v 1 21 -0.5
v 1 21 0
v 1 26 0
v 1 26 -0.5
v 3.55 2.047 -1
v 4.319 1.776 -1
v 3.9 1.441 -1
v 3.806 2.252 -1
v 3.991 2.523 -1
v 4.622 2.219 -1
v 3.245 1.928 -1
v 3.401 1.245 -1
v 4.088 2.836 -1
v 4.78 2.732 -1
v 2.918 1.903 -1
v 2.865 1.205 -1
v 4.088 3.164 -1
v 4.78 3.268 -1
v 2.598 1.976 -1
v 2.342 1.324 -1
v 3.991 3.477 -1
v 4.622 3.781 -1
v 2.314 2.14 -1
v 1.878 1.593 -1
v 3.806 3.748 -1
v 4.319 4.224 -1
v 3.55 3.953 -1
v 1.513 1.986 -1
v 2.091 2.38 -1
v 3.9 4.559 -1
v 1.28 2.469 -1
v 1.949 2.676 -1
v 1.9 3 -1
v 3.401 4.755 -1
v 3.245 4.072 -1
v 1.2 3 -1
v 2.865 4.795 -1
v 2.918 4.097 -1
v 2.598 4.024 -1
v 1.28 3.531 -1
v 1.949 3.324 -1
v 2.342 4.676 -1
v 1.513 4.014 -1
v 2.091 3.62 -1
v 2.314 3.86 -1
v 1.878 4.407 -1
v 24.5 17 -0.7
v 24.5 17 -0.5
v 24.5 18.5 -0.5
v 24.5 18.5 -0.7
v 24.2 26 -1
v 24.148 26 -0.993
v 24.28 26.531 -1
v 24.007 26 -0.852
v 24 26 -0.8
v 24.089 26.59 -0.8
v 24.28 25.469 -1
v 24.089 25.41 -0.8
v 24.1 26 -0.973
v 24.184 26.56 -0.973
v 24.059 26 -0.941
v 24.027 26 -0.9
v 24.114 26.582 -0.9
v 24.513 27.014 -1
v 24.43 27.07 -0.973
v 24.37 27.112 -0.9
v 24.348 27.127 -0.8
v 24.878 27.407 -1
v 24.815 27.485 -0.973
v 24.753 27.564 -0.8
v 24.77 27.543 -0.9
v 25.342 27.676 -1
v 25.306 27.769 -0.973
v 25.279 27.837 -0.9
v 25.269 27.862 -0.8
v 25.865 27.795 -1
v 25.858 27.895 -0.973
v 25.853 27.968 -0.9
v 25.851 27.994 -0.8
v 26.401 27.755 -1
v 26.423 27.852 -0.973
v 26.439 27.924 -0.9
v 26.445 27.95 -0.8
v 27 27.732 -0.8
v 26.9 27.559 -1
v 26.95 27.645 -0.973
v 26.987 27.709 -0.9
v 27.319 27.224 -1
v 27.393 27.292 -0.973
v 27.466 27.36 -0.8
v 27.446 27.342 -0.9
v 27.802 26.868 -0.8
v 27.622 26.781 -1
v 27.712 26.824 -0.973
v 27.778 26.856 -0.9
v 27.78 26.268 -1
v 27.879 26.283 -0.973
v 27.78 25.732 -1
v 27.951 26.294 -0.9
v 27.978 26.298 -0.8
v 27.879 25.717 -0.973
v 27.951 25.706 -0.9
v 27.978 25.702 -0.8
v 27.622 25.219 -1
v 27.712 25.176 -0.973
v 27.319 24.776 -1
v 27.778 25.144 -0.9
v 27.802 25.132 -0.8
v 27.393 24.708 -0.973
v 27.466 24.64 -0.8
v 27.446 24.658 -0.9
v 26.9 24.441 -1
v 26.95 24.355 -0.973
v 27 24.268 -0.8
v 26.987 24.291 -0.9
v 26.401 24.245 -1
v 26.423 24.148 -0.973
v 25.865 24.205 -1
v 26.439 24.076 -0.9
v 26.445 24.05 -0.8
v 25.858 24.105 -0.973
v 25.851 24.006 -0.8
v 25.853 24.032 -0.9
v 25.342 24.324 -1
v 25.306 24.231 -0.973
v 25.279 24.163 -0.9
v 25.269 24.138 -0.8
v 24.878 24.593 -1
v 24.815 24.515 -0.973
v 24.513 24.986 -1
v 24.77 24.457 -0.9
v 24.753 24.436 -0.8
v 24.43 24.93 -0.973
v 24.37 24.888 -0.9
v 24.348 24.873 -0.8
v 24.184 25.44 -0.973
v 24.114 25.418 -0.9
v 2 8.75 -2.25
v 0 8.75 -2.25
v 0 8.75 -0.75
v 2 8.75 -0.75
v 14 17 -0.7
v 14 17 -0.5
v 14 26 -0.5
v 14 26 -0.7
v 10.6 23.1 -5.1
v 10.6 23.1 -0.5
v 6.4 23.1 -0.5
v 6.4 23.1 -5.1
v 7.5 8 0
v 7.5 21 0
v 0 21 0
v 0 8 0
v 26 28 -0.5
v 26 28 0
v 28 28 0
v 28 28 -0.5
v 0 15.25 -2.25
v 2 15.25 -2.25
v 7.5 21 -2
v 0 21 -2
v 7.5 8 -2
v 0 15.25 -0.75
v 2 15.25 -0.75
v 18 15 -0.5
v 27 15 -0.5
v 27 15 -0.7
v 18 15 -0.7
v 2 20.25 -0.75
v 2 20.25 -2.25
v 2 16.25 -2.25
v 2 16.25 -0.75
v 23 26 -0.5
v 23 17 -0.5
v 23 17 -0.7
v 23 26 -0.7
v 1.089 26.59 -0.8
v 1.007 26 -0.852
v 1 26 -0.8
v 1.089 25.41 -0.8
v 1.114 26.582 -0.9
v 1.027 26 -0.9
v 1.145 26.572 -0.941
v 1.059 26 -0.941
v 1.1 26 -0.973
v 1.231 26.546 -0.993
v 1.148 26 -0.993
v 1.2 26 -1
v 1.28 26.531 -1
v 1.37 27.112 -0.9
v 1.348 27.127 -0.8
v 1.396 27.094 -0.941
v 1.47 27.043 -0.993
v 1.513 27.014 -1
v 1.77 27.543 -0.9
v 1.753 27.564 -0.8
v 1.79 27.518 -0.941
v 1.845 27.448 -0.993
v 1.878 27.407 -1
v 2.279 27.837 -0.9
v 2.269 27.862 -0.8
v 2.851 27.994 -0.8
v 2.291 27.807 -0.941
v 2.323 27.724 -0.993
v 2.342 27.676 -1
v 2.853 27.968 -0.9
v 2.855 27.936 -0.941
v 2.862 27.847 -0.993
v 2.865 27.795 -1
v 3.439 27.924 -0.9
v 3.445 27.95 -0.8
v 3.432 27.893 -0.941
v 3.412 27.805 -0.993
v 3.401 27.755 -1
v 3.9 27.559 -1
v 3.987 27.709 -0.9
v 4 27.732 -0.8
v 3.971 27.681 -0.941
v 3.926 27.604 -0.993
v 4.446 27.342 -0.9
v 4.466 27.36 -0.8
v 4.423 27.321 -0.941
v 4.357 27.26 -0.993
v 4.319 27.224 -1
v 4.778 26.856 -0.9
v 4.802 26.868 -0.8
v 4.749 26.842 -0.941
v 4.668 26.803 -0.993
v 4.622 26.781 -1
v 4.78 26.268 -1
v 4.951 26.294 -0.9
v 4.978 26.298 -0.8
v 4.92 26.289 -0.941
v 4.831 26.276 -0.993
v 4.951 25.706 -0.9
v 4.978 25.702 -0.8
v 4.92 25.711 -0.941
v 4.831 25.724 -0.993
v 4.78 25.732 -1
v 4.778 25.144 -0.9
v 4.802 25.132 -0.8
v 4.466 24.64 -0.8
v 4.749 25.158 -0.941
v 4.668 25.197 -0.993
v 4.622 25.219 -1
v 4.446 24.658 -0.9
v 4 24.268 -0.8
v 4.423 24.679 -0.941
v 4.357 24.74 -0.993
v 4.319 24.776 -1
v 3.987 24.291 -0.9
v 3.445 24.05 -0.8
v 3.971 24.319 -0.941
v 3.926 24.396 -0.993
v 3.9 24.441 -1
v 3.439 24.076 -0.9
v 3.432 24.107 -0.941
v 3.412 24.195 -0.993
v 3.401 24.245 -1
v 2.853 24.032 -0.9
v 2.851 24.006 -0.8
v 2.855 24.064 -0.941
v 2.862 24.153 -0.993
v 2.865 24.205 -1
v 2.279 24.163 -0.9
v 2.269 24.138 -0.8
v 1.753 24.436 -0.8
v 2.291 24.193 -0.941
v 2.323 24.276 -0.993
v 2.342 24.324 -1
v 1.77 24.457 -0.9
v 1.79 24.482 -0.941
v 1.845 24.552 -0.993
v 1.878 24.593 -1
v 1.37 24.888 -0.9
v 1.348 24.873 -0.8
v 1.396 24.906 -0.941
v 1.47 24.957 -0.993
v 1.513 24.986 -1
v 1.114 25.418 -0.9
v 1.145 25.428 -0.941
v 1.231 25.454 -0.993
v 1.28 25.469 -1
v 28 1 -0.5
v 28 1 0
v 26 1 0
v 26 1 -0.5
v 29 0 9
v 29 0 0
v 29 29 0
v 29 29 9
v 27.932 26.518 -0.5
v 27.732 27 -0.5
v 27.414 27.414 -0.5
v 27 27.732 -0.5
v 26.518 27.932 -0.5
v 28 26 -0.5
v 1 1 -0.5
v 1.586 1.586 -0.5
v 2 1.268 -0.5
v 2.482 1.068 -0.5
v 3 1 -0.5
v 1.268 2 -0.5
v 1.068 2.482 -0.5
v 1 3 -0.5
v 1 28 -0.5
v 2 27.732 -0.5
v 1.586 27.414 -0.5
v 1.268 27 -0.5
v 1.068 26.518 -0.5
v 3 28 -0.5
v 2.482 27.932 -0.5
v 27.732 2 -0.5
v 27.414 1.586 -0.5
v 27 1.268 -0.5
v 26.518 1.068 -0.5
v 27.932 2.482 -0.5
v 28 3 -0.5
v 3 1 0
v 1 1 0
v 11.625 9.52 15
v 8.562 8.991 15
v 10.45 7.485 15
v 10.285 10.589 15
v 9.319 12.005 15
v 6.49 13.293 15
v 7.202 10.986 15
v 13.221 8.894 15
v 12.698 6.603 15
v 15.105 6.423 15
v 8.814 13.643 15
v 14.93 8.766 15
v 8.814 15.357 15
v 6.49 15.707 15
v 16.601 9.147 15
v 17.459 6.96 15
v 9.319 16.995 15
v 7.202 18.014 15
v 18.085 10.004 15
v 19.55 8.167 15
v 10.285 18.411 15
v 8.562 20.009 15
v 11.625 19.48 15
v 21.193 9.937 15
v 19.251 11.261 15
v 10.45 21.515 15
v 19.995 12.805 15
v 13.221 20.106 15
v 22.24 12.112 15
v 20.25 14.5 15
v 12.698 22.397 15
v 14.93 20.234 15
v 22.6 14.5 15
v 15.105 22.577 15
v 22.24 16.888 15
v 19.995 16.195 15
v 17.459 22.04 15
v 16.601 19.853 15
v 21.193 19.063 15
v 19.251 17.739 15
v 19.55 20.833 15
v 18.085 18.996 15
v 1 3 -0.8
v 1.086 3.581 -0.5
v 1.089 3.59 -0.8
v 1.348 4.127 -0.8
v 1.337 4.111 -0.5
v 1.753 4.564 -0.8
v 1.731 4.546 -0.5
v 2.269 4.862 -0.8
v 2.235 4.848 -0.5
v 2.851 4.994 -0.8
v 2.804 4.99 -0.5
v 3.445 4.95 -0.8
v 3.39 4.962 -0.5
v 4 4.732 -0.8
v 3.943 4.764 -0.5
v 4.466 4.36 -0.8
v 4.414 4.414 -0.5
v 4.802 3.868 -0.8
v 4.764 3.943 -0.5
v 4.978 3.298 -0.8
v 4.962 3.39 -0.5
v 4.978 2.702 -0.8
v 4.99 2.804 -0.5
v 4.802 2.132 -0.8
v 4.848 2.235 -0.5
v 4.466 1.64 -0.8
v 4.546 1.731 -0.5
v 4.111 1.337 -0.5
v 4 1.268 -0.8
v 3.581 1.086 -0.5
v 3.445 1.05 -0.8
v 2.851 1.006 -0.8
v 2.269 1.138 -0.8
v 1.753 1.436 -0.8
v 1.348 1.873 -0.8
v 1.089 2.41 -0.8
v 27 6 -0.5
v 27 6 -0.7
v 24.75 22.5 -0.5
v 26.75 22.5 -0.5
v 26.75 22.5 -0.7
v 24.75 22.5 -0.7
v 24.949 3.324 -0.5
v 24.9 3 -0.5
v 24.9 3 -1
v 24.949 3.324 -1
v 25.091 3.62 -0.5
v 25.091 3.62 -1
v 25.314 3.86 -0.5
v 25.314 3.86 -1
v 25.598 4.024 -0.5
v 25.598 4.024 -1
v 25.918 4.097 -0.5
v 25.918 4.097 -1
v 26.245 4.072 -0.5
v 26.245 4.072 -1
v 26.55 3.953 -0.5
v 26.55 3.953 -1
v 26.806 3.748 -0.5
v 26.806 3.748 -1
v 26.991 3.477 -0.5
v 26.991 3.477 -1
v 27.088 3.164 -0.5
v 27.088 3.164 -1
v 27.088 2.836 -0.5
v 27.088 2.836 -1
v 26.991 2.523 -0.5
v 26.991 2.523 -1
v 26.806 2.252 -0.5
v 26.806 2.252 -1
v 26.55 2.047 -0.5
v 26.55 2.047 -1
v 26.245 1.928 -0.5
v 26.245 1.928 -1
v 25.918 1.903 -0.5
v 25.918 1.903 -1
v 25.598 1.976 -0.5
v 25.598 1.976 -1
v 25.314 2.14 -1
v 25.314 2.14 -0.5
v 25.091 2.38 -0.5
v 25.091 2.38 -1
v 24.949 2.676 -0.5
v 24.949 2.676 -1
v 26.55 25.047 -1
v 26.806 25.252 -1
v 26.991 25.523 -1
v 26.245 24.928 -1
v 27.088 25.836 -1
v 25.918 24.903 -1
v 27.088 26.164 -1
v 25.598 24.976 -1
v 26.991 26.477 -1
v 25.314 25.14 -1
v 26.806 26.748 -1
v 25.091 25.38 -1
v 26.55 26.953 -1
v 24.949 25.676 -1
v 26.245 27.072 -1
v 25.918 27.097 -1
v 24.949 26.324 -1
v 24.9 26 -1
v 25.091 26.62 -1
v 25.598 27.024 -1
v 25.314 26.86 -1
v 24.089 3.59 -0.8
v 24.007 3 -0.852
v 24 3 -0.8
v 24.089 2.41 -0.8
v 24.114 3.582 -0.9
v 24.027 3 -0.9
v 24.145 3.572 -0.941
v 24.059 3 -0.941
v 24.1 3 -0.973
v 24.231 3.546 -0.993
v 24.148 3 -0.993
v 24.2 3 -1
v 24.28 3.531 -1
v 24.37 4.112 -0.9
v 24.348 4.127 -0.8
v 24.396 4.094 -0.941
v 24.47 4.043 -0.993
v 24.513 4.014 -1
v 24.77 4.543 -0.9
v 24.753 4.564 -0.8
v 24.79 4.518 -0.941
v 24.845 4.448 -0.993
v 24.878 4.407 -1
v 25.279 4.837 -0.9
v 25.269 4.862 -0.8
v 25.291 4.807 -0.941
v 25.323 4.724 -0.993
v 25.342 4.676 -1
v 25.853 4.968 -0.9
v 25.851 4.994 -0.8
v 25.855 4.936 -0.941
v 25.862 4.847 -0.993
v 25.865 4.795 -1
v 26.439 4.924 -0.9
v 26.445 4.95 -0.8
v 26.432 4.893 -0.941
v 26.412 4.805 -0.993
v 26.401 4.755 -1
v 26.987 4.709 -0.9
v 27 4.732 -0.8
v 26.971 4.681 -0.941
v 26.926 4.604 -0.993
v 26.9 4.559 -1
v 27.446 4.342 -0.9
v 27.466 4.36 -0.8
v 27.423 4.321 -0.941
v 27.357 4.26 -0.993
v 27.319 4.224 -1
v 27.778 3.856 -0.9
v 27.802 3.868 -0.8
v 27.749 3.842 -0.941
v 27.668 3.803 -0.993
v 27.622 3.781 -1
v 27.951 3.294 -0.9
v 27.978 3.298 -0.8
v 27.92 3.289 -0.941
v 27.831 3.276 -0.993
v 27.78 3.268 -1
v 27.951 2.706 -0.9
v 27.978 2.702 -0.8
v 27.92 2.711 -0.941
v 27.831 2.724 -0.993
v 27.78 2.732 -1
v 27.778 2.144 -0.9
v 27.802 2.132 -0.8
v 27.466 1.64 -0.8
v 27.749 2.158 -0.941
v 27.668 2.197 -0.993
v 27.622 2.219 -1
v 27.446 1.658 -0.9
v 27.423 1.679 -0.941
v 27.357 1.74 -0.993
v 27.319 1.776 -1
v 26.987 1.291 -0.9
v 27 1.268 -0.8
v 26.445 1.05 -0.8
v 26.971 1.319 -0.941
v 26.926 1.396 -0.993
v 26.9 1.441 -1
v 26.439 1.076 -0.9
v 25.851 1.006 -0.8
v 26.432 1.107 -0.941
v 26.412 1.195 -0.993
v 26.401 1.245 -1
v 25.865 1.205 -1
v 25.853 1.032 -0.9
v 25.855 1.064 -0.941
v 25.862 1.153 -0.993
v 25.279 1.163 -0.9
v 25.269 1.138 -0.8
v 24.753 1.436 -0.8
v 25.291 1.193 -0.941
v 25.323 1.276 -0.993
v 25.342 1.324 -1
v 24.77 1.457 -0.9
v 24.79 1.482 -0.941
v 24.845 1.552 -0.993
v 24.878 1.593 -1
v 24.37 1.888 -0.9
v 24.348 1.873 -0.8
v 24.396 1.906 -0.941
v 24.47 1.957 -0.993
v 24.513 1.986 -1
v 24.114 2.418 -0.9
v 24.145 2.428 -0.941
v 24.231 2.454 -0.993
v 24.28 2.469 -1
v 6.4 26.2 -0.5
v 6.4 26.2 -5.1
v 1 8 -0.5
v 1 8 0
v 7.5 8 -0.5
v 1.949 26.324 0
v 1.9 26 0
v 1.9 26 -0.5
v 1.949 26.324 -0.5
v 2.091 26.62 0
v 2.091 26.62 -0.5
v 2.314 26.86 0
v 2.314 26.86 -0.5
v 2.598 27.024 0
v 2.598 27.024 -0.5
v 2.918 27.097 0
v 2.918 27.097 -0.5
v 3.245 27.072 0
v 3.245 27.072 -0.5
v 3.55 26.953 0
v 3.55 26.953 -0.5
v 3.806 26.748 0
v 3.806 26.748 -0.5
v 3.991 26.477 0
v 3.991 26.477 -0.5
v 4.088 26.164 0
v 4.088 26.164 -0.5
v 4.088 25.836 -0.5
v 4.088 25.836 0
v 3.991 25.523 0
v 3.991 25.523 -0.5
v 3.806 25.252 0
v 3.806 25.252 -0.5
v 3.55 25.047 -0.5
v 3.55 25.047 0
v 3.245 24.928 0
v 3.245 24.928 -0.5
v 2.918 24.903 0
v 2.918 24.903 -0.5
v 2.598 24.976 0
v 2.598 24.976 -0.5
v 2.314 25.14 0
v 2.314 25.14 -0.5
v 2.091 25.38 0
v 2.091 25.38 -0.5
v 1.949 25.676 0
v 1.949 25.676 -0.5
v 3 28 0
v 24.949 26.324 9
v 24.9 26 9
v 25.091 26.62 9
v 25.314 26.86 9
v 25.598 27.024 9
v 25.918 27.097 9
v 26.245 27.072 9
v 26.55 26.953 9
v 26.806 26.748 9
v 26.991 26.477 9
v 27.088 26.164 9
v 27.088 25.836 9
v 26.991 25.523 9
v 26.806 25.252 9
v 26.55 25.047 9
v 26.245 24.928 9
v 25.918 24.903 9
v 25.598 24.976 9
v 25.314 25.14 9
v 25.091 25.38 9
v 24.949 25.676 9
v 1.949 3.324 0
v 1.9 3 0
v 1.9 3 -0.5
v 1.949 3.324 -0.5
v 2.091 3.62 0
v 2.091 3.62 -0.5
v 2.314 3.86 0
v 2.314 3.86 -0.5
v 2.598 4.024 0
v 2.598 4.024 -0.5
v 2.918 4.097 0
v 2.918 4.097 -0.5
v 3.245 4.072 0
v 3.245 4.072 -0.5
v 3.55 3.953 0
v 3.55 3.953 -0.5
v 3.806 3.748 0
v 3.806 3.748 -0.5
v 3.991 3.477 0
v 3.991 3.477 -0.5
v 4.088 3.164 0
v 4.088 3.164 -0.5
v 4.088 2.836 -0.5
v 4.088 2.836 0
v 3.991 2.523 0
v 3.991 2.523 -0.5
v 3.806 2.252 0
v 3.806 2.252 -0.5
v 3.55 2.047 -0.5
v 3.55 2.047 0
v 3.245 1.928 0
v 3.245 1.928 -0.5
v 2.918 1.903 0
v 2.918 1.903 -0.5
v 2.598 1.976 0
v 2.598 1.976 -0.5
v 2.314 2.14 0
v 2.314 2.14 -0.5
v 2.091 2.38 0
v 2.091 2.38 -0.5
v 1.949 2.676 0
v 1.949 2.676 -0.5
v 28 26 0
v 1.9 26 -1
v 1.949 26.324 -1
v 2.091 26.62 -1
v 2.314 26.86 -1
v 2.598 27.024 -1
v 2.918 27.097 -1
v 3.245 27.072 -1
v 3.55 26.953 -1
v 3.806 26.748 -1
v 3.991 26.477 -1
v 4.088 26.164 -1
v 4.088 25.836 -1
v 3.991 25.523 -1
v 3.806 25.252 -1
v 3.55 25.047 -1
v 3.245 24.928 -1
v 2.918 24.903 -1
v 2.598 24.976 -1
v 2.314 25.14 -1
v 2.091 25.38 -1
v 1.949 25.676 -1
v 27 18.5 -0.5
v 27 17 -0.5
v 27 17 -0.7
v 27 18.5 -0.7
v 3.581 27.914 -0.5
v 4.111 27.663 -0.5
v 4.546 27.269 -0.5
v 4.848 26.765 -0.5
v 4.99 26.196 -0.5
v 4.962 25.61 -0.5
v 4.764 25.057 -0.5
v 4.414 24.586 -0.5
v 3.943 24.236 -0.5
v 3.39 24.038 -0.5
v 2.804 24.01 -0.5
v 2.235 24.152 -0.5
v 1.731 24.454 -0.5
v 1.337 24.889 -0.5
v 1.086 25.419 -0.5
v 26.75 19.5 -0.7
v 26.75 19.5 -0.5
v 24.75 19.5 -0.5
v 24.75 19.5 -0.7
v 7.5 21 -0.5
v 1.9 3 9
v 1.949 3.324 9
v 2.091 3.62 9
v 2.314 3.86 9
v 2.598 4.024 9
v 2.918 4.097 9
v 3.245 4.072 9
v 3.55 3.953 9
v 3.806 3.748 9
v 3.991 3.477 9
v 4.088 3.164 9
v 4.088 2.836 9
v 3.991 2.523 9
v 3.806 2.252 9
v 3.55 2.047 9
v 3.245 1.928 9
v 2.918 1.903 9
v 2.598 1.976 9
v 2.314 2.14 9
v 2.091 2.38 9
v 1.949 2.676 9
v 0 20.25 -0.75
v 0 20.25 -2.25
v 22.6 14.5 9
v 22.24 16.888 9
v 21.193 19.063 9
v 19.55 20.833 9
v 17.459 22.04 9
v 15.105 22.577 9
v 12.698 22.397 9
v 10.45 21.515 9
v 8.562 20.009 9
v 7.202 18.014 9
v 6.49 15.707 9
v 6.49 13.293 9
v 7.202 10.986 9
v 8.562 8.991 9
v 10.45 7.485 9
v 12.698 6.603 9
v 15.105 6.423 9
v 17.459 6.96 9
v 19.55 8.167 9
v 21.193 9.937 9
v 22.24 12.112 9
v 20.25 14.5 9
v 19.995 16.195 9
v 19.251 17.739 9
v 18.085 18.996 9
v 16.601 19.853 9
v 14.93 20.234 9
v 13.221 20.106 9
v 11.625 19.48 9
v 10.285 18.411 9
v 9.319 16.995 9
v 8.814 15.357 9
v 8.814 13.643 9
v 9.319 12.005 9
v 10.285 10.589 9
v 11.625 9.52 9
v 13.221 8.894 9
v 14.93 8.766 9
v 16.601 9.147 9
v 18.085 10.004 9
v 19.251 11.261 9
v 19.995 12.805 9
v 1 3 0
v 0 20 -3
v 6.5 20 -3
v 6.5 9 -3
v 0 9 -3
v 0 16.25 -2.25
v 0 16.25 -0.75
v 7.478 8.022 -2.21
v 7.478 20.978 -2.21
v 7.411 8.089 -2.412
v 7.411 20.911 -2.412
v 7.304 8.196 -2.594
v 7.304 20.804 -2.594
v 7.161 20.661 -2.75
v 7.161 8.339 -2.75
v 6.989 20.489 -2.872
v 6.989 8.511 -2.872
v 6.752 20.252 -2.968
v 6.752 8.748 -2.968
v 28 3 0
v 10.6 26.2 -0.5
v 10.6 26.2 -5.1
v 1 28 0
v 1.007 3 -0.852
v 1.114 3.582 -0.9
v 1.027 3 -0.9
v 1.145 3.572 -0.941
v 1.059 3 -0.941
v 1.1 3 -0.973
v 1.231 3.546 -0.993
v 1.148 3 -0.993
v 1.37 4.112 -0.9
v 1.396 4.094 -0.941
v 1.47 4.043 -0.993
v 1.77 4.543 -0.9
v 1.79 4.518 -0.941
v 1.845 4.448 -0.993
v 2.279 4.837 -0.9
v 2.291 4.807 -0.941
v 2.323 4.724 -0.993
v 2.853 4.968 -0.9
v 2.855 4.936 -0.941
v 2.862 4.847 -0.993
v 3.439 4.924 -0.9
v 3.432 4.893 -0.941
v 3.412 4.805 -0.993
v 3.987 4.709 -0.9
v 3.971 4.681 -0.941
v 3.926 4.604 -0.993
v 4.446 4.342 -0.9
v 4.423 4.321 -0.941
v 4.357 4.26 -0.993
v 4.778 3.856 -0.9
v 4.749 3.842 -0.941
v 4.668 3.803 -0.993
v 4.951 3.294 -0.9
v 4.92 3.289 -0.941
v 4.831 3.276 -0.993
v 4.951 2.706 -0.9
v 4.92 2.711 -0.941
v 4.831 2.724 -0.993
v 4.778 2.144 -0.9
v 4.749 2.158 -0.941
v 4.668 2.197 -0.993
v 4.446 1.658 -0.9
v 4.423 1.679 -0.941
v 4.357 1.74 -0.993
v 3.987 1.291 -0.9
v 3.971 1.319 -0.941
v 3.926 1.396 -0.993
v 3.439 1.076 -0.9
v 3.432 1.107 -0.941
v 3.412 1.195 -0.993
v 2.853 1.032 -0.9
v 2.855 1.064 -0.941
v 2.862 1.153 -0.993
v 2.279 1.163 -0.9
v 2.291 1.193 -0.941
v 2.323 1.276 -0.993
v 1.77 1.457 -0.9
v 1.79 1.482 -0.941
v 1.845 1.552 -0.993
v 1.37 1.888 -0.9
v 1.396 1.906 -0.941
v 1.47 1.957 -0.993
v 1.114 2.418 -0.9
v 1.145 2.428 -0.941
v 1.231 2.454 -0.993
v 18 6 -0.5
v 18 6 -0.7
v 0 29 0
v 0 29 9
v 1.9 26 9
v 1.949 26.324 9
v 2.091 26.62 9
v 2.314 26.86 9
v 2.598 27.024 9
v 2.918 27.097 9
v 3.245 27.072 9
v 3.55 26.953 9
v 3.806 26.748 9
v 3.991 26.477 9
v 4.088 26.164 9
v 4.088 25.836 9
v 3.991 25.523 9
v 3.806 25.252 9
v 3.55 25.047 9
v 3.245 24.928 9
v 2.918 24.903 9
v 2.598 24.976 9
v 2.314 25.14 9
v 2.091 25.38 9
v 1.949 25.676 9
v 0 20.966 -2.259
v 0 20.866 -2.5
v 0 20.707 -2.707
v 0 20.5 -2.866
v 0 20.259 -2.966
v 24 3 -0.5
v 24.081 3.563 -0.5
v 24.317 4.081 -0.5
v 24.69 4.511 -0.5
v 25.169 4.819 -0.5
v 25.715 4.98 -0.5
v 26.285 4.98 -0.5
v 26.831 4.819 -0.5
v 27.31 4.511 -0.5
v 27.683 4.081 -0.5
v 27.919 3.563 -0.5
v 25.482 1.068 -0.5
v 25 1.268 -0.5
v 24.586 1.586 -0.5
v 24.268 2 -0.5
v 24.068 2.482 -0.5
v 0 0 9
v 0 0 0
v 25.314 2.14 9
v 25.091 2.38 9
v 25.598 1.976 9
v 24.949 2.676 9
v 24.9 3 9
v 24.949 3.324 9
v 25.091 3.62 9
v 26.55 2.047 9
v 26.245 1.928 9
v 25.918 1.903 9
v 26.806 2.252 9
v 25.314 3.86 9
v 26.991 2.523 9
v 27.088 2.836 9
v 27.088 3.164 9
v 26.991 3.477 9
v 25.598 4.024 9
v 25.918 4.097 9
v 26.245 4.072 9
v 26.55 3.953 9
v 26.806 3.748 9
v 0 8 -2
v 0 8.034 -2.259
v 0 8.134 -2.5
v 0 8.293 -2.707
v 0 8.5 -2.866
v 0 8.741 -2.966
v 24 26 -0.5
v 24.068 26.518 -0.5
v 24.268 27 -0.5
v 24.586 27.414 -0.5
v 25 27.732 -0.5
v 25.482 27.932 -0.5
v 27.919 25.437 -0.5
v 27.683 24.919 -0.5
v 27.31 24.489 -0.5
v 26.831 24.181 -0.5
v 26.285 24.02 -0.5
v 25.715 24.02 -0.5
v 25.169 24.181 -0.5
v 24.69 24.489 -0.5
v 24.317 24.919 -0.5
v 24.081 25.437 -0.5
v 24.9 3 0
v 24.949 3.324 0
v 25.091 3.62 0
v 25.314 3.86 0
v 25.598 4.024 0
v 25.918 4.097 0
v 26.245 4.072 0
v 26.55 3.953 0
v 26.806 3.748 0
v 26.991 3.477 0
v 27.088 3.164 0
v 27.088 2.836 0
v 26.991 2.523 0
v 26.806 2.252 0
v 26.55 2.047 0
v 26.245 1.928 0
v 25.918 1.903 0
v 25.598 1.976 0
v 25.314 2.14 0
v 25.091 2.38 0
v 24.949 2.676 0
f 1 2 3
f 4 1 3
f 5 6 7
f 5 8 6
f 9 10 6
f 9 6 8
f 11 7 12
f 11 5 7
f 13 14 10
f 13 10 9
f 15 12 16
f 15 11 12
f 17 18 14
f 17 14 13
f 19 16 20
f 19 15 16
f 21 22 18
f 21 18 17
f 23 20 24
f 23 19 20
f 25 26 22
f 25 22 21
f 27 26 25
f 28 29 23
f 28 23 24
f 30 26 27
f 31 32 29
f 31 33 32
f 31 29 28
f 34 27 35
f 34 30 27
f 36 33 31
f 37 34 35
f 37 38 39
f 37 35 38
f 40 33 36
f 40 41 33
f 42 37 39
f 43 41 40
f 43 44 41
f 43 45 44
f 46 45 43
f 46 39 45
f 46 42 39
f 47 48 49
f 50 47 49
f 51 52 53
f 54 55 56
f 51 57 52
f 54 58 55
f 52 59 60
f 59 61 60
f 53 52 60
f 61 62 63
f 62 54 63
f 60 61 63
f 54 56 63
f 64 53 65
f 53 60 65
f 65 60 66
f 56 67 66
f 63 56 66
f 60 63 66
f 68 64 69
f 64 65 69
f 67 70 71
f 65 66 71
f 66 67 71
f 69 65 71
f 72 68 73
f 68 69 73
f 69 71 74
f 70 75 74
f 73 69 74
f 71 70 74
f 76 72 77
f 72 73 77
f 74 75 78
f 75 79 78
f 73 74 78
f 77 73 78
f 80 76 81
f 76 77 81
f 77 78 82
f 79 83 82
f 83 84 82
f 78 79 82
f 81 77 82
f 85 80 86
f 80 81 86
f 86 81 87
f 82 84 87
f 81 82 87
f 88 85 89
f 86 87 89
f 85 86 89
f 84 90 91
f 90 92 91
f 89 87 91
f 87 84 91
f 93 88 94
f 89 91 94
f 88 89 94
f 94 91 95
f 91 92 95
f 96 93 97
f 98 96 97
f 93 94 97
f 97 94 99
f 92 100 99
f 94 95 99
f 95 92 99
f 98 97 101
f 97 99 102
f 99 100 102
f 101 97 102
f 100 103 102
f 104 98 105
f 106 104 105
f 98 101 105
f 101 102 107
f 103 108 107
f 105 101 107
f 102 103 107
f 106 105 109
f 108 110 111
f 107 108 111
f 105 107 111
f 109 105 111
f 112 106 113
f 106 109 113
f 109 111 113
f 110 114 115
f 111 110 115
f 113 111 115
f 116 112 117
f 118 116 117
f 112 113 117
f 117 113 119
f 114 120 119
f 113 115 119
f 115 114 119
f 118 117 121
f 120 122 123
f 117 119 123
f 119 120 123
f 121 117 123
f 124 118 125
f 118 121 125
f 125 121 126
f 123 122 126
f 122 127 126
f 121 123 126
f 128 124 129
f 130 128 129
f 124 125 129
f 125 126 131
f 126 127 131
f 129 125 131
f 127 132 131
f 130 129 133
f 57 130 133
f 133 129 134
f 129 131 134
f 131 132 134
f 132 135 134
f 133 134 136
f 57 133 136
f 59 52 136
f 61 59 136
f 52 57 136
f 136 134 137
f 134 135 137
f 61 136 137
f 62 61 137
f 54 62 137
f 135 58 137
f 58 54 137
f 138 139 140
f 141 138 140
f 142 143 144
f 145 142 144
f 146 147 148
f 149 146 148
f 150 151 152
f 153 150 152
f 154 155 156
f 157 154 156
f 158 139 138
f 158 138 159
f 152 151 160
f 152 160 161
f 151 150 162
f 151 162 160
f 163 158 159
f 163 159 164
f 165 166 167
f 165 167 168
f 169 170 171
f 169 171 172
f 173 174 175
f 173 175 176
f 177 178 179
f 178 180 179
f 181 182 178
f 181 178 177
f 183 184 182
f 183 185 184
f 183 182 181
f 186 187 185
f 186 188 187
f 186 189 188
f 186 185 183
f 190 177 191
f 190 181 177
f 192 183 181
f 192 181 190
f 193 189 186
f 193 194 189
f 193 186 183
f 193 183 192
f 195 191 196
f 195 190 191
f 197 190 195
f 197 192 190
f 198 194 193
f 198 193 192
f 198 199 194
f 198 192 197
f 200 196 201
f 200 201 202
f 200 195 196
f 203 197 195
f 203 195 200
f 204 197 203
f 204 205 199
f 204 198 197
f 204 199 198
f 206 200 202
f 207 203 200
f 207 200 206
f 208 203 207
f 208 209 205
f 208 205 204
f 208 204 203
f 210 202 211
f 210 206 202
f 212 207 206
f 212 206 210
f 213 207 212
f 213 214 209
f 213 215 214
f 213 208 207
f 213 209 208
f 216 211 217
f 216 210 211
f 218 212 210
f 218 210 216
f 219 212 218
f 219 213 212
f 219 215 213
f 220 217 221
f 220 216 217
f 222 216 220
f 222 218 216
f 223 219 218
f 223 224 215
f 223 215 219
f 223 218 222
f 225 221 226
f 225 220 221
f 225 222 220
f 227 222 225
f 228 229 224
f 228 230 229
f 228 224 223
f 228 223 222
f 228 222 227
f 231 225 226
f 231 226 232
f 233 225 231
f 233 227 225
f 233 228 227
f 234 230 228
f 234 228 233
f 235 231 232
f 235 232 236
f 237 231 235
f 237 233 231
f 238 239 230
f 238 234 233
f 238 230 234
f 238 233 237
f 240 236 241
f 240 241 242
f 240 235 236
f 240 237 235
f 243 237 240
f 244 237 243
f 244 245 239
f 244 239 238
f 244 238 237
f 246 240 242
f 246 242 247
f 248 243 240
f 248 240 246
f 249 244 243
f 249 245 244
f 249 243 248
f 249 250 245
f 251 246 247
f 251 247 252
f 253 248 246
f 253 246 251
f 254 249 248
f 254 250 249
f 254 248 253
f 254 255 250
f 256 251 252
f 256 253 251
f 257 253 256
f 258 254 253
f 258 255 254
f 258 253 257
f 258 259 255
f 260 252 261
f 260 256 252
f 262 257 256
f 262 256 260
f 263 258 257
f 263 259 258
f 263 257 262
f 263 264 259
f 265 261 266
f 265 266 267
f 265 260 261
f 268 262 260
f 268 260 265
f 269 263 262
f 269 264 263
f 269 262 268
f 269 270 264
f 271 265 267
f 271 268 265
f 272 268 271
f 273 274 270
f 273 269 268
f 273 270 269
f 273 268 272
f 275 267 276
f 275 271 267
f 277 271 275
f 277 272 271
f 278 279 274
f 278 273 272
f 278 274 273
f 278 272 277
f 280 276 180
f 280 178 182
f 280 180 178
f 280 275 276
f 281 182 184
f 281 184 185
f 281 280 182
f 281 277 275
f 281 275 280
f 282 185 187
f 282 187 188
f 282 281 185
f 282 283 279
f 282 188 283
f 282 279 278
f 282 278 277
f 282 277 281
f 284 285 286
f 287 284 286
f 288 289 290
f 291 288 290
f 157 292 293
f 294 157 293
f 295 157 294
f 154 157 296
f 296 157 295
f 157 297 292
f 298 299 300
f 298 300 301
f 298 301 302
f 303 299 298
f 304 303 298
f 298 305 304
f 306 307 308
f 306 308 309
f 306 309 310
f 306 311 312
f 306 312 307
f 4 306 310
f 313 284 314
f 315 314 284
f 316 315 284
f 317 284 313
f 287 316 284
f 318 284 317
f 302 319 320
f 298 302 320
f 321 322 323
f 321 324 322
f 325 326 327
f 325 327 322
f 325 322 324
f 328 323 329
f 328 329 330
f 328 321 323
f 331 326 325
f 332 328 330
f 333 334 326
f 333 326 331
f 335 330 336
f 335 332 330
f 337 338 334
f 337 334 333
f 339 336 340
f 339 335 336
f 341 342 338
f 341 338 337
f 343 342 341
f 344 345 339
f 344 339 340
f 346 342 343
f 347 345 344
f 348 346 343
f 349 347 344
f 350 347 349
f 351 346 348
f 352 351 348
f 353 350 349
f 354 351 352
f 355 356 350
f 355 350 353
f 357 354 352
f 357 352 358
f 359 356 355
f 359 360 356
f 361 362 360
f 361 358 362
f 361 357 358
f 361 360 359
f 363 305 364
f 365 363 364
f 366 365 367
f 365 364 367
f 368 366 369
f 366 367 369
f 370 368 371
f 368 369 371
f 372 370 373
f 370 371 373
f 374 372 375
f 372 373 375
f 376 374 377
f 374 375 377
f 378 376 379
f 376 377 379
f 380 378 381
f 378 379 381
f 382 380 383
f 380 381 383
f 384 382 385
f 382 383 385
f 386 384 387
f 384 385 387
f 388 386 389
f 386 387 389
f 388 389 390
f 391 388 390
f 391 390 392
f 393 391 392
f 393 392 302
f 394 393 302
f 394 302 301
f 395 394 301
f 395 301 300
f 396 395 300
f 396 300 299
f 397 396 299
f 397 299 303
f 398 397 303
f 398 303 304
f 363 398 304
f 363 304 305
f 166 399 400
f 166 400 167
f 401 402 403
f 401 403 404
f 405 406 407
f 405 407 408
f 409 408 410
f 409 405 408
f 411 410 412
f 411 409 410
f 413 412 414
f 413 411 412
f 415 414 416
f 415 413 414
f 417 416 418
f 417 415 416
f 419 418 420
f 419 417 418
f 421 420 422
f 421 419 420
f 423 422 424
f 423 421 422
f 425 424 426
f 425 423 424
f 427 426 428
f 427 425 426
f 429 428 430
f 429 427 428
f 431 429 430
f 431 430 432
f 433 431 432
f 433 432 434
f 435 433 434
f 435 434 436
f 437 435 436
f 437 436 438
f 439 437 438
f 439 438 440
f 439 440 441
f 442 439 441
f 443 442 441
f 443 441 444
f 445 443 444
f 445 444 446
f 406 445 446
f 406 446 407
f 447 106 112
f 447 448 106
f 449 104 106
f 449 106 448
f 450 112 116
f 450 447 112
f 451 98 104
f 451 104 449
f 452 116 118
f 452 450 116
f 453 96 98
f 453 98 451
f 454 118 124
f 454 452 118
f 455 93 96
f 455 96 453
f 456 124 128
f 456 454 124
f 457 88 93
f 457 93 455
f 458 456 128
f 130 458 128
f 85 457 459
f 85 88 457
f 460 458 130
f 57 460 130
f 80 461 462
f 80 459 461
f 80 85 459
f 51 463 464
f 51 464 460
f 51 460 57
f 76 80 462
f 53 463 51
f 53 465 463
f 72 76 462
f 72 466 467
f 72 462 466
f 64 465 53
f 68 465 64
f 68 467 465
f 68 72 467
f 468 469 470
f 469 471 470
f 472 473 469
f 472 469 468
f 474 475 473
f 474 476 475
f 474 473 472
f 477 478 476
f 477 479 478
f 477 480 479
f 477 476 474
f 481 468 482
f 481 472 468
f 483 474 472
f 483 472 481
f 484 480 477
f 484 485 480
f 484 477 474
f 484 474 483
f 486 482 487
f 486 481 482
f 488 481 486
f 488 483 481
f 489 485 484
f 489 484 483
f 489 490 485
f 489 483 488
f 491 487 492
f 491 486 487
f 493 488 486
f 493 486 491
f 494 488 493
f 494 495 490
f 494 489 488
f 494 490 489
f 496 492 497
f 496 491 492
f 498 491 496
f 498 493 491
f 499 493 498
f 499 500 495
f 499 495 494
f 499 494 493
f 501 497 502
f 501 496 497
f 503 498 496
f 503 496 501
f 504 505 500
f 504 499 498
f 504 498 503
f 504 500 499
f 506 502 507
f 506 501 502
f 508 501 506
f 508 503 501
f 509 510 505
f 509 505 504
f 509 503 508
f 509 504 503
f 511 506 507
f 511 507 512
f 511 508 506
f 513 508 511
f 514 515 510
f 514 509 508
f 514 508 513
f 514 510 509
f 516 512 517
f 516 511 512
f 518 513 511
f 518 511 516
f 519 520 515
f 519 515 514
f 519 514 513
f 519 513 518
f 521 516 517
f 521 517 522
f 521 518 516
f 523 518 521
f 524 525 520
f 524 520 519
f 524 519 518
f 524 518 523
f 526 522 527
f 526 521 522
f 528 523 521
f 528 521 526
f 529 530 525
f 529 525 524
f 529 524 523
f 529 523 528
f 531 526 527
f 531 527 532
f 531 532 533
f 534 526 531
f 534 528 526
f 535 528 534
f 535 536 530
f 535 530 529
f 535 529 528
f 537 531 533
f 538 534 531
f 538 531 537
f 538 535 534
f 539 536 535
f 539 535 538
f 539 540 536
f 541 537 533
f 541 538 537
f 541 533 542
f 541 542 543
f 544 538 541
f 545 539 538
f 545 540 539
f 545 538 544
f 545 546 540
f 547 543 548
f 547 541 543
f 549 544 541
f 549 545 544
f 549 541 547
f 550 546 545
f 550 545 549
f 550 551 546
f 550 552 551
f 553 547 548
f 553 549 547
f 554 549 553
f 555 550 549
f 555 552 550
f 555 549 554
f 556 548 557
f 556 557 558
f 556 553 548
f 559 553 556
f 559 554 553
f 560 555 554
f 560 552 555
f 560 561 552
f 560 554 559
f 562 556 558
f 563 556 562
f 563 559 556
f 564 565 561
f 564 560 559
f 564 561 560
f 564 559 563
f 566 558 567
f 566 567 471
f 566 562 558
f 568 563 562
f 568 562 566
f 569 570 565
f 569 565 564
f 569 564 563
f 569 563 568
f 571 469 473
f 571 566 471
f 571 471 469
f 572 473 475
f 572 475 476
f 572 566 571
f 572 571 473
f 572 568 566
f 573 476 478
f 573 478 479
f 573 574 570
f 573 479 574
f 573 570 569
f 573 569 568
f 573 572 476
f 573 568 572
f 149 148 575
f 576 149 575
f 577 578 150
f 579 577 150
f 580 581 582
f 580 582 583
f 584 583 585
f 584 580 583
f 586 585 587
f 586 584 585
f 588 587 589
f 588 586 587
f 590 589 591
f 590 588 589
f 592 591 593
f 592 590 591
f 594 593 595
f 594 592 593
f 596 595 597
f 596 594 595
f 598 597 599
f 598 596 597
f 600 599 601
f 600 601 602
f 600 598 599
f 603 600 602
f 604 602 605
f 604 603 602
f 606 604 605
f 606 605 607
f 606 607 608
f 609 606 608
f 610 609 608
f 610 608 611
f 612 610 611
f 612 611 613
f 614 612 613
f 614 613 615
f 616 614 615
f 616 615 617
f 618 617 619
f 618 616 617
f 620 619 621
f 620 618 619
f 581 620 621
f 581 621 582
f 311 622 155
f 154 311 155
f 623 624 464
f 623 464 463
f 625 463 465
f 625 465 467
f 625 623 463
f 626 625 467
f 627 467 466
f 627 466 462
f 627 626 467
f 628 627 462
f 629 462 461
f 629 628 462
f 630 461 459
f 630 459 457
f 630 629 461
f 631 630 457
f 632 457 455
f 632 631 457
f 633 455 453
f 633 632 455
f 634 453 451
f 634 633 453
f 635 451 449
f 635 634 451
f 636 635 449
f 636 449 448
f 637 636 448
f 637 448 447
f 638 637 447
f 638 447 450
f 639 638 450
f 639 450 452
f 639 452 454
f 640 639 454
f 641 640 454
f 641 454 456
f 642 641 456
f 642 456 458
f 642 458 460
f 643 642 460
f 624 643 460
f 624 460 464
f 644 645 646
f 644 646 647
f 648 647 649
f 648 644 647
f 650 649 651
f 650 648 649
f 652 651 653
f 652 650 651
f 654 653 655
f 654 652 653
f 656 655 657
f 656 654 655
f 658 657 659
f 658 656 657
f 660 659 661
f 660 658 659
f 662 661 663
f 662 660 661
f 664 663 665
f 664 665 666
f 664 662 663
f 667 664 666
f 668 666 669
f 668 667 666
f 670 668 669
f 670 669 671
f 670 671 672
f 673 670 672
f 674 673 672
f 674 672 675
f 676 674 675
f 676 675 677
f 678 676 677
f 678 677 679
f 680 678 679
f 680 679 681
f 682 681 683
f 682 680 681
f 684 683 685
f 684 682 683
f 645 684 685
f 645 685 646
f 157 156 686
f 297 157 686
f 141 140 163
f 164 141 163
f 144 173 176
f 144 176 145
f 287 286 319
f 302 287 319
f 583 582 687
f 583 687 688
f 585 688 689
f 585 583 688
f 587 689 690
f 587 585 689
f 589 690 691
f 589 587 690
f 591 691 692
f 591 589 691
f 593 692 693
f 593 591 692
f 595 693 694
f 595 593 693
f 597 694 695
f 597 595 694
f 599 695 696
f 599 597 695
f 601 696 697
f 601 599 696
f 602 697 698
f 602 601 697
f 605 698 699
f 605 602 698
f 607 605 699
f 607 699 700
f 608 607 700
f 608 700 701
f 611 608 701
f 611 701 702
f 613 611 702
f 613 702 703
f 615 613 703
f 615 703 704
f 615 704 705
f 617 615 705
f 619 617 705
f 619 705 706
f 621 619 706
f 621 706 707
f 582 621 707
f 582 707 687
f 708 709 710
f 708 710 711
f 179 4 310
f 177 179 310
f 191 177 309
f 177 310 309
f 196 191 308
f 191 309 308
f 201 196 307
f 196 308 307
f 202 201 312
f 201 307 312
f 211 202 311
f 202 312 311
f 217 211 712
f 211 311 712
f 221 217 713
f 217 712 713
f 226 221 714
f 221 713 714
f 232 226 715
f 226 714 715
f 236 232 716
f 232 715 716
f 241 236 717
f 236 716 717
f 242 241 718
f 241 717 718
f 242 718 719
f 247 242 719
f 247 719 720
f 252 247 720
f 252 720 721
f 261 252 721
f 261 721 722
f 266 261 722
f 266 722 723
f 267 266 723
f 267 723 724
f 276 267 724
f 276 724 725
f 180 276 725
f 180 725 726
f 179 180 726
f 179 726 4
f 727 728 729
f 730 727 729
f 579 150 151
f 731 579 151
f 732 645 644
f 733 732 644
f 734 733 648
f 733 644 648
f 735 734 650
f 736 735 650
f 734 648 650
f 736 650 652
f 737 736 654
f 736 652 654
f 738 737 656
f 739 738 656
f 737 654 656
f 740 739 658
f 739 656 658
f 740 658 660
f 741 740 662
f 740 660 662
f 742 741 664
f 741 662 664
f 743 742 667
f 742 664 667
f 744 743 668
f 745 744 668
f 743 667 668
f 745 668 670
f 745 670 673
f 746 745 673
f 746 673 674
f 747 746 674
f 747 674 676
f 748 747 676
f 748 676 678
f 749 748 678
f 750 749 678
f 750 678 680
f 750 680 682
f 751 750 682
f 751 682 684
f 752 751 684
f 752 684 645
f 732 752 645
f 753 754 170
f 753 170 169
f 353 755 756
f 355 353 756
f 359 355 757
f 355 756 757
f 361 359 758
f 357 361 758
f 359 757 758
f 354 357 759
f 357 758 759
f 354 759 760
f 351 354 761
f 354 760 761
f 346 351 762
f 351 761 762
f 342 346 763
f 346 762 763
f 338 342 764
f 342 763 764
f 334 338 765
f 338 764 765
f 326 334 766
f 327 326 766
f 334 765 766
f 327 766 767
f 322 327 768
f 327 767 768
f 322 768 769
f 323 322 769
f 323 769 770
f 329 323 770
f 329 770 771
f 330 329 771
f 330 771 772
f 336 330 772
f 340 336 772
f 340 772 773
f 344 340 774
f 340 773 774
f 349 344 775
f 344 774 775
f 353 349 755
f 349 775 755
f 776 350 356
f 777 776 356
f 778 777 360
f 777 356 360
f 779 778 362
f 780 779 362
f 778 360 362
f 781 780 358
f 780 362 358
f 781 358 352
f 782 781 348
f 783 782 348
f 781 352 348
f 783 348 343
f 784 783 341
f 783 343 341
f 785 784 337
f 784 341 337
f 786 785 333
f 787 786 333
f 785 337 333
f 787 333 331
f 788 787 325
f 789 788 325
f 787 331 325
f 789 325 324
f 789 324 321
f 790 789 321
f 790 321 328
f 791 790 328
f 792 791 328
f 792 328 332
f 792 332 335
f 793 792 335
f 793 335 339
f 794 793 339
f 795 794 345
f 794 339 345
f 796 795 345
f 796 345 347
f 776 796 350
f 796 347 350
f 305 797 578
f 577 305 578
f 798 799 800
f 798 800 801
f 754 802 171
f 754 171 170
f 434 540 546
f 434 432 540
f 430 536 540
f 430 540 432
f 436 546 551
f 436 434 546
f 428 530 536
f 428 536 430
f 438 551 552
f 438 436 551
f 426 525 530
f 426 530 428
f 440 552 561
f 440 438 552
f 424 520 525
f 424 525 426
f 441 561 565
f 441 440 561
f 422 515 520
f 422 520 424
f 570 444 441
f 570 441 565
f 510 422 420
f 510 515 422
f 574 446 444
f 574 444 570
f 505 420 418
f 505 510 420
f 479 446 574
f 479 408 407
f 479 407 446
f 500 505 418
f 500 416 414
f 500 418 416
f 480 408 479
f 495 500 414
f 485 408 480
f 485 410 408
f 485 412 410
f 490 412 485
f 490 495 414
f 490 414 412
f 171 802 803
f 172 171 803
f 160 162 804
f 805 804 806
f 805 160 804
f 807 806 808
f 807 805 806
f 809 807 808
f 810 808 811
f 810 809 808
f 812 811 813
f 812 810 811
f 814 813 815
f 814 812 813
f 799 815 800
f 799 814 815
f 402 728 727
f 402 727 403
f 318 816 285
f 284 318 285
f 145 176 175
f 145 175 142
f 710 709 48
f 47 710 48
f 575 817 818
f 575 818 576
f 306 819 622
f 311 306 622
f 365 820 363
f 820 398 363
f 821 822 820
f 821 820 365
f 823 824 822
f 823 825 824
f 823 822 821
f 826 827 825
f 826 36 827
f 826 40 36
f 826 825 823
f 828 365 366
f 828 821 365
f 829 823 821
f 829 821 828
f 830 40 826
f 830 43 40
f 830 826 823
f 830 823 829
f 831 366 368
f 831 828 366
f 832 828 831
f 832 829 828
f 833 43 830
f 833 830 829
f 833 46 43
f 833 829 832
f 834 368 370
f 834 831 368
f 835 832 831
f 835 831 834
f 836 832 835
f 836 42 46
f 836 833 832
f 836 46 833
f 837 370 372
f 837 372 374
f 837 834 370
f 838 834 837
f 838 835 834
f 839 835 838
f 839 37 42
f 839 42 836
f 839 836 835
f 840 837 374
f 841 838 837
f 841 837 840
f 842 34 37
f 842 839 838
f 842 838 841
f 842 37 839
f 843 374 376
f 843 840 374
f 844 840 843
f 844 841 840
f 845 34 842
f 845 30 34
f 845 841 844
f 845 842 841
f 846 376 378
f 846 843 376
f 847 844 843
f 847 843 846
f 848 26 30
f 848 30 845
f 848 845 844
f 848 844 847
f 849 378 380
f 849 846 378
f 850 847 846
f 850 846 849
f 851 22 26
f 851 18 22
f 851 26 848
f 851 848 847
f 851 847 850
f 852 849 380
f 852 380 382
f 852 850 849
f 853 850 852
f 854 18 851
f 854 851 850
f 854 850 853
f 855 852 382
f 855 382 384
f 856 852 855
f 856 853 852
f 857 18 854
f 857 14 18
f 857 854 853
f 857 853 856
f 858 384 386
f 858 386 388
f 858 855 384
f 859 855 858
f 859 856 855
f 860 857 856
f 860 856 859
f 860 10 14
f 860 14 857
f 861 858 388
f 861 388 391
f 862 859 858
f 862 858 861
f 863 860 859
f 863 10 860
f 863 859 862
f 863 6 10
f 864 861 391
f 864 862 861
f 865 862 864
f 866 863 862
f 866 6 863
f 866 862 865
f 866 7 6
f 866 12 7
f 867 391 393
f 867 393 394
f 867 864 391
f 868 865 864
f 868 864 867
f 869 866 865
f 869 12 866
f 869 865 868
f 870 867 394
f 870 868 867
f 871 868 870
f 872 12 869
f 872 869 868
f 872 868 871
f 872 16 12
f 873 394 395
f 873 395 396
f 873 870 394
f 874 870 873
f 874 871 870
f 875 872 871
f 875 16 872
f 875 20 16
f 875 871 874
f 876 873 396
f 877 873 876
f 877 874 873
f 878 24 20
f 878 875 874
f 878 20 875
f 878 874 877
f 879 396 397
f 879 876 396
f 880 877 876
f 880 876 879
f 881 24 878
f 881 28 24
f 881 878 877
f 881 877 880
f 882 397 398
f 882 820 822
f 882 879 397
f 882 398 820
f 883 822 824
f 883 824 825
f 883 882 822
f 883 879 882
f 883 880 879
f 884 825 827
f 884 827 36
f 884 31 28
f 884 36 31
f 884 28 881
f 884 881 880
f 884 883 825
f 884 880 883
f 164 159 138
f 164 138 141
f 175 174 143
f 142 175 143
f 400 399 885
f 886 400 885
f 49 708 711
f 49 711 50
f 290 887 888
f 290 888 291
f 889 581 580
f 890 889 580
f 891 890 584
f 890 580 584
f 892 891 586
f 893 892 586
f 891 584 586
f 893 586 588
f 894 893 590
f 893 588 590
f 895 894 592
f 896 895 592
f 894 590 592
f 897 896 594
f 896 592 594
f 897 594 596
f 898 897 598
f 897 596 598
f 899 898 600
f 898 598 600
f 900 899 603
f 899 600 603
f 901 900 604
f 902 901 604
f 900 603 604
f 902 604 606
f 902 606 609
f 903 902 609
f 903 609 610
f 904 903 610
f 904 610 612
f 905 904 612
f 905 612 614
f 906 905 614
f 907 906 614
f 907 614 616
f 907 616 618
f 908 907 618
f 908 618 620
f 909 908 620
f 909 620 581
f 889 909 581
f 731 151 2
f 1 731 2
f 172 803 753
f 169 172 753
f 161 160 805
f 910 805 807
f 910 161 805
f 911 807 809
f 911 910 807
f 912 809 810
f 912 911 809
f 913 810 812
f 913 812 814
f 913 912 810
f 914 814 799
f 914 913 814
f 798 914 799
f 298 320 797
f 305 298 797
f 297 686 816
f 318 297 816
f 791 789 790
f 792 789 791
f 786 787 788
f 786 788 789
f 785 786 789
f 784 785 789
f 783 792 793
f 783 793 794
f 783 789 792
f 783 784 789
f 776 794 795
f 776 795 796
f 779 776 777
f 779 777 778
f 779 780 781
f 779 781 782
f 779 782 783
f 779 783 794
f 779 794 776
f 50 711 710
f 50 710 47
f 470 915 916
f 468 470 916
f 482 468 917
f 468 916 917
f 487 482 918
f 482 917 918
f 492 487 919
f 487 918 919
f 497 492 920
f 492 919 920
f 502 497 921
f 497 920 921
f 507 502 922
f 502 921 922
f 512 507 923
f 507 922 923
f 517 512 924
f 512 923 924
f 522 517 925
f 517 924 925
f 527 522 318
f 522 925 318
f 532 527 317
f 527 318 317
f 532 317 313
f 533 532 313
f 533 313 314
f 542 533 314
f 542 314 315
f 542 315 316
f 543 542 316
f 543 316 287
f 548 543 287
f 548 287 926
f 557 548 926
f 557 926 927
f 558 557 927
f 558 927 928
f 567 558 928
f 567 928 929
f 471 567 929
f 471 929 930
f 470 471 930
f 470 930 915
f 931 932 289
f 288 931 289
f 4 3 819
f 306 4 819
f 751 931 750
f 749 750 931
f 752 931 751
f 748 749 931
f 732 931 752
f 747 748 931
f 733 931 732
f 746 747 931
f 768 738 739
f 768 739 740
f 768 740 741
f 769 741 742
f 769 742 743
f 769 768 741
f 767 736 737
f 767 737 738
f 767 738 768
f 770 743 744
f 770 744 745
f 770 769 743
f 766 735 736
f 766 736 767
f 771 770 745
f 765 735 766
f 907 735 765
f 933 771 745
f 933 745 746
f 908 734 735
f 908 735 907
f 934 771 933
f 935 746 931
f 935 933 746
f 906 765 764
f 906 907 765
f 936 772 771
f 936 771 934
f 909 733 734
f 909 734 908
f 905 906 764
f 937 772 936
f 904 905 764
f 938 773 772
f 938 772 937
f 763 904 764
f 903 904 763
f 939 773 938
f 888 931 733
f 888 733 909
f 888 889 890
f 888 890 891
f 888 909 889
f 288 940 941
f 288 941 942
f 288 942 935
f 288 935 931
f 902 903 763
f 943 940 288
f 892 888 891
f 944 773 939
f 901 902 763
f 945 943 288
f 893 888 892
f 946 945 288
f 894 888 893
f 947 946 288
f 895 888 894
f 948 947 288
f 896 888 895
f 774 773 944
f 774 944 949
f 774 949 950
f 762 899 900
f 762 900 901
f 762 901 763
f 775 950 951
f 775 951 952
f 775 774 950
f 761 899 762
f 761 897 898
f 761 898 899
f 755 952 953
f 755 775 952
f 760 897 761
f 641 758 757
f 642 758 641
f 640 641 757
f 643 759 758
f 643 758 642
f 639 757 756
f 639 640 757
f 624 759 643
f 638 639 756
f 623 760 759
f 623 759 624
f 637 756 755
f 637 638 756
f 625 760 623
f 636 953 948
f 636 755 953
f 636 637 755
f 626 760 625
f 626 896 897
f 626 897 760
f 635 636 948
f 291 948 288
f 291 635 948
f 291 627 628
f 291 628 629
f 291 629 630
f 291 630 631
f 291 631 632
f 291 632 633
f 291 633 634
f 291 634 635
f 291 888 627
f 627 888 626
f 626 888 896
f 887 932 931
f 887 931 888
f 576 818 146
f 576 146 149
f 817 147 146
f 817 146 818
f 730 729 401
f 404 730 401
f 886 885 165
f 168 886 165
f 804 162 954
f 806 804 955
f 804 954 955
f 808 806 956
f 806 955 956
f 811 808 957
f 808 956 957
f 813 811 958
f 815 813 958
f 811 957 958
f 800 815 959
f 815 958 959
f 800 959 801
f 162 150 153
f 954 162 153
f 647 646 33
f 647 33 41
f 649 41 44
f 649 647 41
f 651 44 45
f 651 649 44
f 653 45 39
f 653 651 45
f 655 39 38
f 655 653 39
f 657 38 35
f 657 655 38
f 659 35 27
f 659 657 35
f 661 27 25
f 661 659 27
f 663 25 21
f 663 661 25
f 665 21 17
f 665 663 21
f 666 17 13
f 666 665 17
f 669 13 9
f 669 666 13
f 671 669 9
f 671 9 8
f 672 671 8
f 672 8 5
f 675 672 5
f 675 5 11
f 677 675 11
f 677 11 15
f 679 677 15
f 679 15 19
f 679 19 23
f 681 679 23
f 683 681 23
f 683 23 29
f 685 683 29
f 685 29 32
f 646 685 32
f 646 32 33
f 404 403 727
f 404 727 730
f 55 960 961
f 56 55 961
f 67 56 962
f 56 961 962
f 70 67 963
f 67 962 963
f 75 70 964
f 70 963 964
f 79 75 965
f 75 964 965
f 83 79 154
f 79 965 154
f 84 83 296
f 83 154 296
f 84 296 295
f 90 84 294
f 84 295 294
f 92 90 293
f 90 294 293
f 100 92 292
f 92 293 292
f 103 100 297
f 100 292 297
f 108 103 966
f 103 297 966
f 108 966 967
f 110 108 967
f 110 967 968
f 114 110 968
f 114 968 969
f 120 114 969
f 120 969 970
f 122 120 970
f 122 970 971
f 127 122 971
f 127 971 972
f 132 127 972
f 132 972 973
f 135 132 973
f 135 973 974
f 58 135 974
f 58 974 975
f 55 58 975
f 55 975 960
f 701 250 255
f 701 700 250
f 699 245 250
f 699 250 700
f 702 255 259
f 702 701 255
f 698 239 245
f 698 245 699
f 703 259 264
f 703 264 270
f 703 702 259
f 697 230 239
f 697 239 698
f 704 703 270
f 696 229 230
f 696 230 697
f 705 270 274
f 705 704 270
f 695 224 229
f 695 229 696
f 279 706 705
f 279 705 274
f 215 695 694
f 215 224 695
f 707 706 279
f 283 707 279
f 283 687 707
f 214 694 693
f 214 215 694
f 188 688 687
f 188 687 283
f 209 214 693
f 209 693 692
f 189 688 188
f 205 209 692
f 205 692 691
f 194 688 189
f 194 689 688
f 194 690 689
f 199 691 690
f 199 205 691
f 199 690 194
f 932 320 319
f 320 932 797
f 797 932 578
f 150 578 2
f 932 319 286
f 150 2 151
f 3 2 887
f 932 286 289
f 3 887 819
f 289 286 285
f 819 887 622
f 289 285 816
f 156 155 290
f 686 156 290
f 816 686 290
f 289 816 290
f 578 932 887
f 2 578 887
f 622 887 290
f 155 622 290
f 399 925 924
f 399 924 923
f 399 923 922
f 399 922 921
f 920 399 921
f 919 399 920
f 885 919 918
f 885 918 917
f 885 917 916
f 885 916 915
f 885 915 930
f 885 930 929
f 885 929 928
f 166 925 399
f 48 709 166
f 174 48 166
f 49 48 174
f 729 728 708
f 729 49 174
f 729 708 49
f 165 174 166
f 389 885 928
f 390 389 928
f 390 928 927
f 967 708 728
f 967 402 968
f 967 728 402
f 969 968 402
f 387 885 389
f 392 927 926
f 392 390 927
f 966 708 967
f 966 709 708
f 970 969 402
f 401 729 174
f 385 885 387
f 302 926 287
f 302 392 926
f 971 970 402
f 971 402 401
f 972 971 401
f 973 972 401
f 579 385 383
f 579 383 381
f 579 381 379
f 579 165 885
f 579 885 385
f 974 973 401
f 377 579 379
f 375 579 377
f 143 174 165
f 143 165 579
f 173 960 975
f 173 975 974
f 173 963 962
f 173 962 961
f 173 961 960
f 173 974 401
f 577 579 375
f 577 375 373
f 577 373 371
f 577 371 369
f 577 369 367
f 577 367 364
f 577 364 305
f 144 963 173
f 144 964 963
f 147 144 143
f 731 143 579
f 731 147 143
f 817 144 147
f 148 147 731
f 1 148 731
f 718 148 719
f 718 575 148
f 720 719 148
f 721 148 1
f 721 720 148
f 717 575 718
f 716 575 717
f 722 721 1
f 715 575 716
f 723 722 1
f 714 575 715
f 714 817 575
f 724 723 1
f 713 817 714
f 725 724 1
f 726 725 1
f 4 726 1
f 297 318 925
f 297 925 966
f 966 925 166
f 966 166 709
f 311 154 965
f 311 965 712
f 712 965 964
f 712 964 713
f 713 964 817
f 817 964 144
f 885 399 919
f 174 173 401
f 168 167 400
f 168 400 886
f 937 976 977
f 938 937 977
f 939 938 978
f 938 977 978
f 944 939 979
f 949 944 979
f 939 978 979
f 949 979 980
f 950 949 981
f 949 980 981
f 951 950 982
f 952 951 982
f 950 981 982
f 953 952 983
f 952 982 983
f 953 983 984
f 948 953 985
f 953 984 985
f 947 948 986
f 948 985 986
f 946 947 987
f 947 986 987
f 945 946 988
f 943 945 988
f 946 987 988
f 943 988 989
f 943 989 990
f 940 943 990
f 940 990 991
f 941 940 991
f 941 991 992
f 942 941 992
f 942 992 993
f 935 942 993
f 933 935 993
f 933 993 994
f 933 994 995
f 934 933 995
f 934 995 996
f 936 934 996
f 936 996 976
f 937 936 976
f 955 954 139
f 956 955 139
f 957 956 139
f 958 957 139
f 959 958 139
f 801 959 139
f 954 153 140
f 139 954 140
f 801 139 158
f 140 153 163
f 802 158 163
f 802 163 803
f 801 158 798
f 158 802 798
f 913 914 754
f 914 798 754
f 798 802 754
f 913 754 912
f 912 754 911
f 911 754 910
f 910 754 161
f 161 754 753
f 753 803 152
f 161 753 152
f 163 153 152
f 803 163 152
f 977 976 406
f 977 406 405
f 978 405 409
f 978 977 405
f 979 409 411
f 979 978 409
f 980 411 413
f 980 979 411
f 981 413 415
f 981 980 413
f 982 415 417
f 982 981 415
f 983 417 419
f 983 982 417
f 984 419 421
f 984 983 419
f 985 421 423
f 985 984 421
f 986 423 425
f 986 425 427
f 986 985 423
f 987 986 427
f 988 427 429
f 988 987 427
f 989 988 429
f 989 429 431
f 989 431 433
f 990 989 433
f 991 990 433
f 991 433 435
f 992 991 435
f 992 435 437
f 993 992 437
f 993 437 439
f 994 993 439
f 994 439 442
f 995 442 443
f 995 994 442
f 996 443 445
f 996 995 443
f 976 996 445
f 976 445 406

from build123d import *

# Parameters (mm, degrees)
SKETCH1_W           = 29
SKETCH1_H           = 29
BOSS_EXTRUDE1_DEPTH = 9
SKETCH3_R           = 8.1
BOSS_EXTRUDE2_DEPTH = 6
SKETCH4_R           = 5.75
CUT_EXTRUDE1_DEPTH  = 6
SKETCH5_R           = 1.1
CUT_EXTRUDE2_DEPTH  = 16
SKETCH6_R           = 1.1
BOSS_EXTRUDE3_DEPTH = 0.5
SKETCH7_R           = 2
SKETCH7_R_2         = 1.1
BOSS_EXTRUDE4_DEPTH = 1
SKETCH8_W           = 7.5
SKETCH8_H           = 13
BOSS_EXTRUDE5_DEPTH = 3
FILLET1_R           = 1
SKETCH9_W           = 1.5
SKETCH9_H           = 4
SKETCH9_H_2         = 6.5
CUT_EXTRUDE3_DEPTH  = 2
SKETCH10_W          = 4.2
SKETCH10_H          = 3.1
BOSS_EXTRUDE6_DEPTH = 4.6
SKETCH11_W          = 9
SKETCH11_H          = 9
SKETCH11_W_2        = 2.5
SKETCH11_H_2        = 1.5
SKETCH11_W_3        = 2
SKETCH11_H_3        = 3
BOSS_EXTRUDE7_DEPTH = 0.2
FILLET2_R           = 0.2


with BuildPart() as part:
    # Sketch1 → Boss-Extrude1 (new body)
    with BuildSketch(Plane.XY):
        with Locations((14.5, 14.5)):
            Rectangle(SKETCH1_W, SKETCH1_H)
    extrude(amount=BOSS_EXTRUDE1_DEPTH)

    # Sketch3 → Boss-Extrude2 (add)
    with BuildSketch(Plane.XY.offset(9)):
        with Locations((14.5, 14.5)):
            Circle(SKETCH3_R)
    extrude(amount=BOSS_EXTRUDE2_DEPTH)

    # Sketch4 → Cut-Extrude1 (cut)
    with BuildSketch(Plane.XY.offset(15)):
        with Locations((14.5, 14.5)):
            Circle(SKETCH4_R)
    extrude(amount=-CUT_EXTRUDE1_DEPTH, mode=Mode.SUBTRACT)

    # Sketch5 → Cut-Extrude2 (cut, through all)
    with BuildSketch(Plane(origin=(0, 0, 0), x_dir=(-1, 0, 0), z_dir=(0, 0, -1))):
        with Locations((-26, 26)):
            Circle(SKETCH5_R)
        with Locations((-3, 26)):
            Circle(SKETCH5_R)
        with Locations((-3, 3)):
            Circle(SKETCH5_R)
        with Locations((-26, 3)):
            Circle(SKETCH5_R)
    extrude(amount=-CUT_EXTRUDE2_DEPTH, mode=Mode.SUBTRACT)

    # Sketch6 → Boss-Extrude3 (add)
    with BuildSketch(Plane(origin=(0, 0, 0), x_dir=(-1, 0, 0), z_dir=(0, 0, -1))):
        Polygon((-28, 28), (-28, 1), (-1, 1), (-1, 8), (-7.5, 8), (-7.5, 21), (-1, 21), (-1, 28), align=None)
        with Locations((-26, 3)):
            Circle(SKETCH6_R, mode=Mode.SUBTRACT)
        with Locations((-3, 3)):
            Circle(SKETCH6_R, mode=Mode.SUBTRACT)
        with Locations((-3, 26)):
            Circle(SKETCH6_R, mode=Mode.SUBTRACT)
        with Locations((-26, 26)):
            Circle(SKETCH6_R, mode=Mode.SUBTRACT)
    extrude(amount=BOSS_EXTRUDE3_DEPTH)

    # Sketch7 → Boss-Extrude4 (add)
    with BuildSketch(Plane(origin=(0, 0, 0), x_dir=(-1, 0, 0), z_dir=(0, 0, -1))):
        with Locations((-26, 26)):
            Circle(SKETCH7_R)
        with Locations((-26, 26)):
            Circle(SKETCH7_R_2, mode=Mode.SUBTRACT)
        with Locations((-3, 26)):
            Circle(SKETCH7_R)
        with Locations((-3, 26)):
            Circle(SKETCH7_R_2, mode=Mode.SUBTRACT)
        with Locations((-3, 3)):
            Circle(SKETCH7_R)
        with Locations((-3, 3)):
            Circle(SKETCH7_R_2, mode=Mode.SUBTRACT)
        with Locations((-26, 3)):
            Circle(SKETCH7_R)
        with Locations((-26, 3)):
            Circle(SKETCH7_R_2, mode=Mode.SUBTRACT)
    extrude(amount=BOSS_EXTRUDE4_DEPTH)

    # Sketch10 → Boss-Extrude6 (add)
    with BuildSketch(Plane(origin=(0, 0, -0.5), x_dir=(-1, 0, 0), z_dir=(0, 0, -1))):
        with Locations((-8.5, 24.65)):
            Rectangle(SKETCH10_W, SKETCH10_H)
    extrude(amount=BOSS_EXTRUDE6_DEPTH)

    # Sketch11 → Boss-Extrude7 (add)
    with BuildSketch(Plane(origin=(0, 0, -0.5), x_dir=(-1, 0, 0), z_dir=(0, 0, -1))):
        with Locations((-18.5, 21.5)):
            Rectangle(SKETCH11_W, SKETCH11_H)
        with Locations((-22.5, 10.5)):
            Rectangle(SKETCH11_W, SKETCH11_H)
        with Locations((-25.75, 17.75)):
            Rectangle(SKETCH11_W_2, SKETCH11_H_2)
        with Locations((-25.75, 21)):
            Rectangle(SKETCH11_W_3, SKETCH11_H_3)
    extrude(amount=BOSS_EXTRUDE7_DEPTH)

    # Fillet2
    fillet2_edges = [part.edges().sort_by_distance(p)[0] for p in [
        (5, 3, -1),
        (28, 3, -1),
        (28, 26, -1),
        (5, 26, -1),
    ]]
    fillet(fillet2_edges, radius=FILLET2_R)


with BuildPart() as body_2:
    # Sketch8 → Boss-Extrude5 (new body)
    with BuildSketch(Plane(origin=(0, 0, 0), x_dir=(-1, 0, 0), z_dir=(0, 0, -1))):
        with Locations((-3.75, 14.5)):
            Rectangle(SKETCH8_W, SKETCH8_H)
    extrude(amount=BOSS_EXTRUDE5_DEPTH)

    # Fillet1
    fillet1_edges = [body_2.edges().sort_by_distance(p)[0] for p in [
        (3.75, 21, -3),
        (7.5, 14.5, -3),
        (3.75, 8, -3),
    ]]
    fillet(fillet1_edges, radius=FILLET1_R)

    # Sketch9 → Cut-Extrude3 (cut)
    with BuildSketch(Plane.ZY):
        with Locations((-1.5, 18.25)):
            Rectangle(SKETCH9_W, SKETCH9_H)
        with Locations((-1.5, 12)):
            Rectangle(SKETCH9_W, SKETCH9_H_2)
    extrude(amount=-CUT_EXTRUDE3_DEPTH, mode=Mode.SUBTRACT)


solid = Compound([part.part, body_2.part])
